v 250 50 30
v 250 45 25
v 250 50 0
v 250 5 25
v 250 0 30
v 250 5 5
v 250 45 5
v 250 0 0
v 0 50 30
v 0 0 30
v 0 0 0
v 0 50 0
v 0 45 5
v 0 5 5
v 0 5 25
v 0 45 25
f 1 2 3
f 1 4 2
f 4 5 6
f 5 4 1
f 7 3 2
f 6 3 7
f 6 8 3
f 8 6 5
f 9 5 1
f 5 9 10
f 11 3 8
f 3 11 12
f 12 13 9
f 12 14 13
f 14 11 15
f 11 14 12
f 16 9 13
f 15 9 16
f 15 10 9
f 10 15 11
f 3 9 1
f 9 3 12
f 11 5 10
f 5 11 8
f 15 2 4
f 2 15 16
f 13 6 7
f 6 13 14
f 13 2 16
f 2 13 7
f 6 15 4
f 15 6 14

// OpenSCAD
$fn = 32;

// ----------------------------------------------------------------------
// Box beam: 200-250 mm hollow beam
// ----------------------------------------------------------------------

// --- parameters (mm) ---
beam_l = 250;             // beam length, X
beam_w = 50;              // beam width, Y
beam_h = 30;              // beam height, Z
wall = 5;                 // wall thickness

difference() {
  cube([beam_l, beam_w, beam_h]);
  translate([-1, wall, wall])
    cube([beam_l + 2, beam_w - 2 * wall, beam_h - 2 * wall]);
}
